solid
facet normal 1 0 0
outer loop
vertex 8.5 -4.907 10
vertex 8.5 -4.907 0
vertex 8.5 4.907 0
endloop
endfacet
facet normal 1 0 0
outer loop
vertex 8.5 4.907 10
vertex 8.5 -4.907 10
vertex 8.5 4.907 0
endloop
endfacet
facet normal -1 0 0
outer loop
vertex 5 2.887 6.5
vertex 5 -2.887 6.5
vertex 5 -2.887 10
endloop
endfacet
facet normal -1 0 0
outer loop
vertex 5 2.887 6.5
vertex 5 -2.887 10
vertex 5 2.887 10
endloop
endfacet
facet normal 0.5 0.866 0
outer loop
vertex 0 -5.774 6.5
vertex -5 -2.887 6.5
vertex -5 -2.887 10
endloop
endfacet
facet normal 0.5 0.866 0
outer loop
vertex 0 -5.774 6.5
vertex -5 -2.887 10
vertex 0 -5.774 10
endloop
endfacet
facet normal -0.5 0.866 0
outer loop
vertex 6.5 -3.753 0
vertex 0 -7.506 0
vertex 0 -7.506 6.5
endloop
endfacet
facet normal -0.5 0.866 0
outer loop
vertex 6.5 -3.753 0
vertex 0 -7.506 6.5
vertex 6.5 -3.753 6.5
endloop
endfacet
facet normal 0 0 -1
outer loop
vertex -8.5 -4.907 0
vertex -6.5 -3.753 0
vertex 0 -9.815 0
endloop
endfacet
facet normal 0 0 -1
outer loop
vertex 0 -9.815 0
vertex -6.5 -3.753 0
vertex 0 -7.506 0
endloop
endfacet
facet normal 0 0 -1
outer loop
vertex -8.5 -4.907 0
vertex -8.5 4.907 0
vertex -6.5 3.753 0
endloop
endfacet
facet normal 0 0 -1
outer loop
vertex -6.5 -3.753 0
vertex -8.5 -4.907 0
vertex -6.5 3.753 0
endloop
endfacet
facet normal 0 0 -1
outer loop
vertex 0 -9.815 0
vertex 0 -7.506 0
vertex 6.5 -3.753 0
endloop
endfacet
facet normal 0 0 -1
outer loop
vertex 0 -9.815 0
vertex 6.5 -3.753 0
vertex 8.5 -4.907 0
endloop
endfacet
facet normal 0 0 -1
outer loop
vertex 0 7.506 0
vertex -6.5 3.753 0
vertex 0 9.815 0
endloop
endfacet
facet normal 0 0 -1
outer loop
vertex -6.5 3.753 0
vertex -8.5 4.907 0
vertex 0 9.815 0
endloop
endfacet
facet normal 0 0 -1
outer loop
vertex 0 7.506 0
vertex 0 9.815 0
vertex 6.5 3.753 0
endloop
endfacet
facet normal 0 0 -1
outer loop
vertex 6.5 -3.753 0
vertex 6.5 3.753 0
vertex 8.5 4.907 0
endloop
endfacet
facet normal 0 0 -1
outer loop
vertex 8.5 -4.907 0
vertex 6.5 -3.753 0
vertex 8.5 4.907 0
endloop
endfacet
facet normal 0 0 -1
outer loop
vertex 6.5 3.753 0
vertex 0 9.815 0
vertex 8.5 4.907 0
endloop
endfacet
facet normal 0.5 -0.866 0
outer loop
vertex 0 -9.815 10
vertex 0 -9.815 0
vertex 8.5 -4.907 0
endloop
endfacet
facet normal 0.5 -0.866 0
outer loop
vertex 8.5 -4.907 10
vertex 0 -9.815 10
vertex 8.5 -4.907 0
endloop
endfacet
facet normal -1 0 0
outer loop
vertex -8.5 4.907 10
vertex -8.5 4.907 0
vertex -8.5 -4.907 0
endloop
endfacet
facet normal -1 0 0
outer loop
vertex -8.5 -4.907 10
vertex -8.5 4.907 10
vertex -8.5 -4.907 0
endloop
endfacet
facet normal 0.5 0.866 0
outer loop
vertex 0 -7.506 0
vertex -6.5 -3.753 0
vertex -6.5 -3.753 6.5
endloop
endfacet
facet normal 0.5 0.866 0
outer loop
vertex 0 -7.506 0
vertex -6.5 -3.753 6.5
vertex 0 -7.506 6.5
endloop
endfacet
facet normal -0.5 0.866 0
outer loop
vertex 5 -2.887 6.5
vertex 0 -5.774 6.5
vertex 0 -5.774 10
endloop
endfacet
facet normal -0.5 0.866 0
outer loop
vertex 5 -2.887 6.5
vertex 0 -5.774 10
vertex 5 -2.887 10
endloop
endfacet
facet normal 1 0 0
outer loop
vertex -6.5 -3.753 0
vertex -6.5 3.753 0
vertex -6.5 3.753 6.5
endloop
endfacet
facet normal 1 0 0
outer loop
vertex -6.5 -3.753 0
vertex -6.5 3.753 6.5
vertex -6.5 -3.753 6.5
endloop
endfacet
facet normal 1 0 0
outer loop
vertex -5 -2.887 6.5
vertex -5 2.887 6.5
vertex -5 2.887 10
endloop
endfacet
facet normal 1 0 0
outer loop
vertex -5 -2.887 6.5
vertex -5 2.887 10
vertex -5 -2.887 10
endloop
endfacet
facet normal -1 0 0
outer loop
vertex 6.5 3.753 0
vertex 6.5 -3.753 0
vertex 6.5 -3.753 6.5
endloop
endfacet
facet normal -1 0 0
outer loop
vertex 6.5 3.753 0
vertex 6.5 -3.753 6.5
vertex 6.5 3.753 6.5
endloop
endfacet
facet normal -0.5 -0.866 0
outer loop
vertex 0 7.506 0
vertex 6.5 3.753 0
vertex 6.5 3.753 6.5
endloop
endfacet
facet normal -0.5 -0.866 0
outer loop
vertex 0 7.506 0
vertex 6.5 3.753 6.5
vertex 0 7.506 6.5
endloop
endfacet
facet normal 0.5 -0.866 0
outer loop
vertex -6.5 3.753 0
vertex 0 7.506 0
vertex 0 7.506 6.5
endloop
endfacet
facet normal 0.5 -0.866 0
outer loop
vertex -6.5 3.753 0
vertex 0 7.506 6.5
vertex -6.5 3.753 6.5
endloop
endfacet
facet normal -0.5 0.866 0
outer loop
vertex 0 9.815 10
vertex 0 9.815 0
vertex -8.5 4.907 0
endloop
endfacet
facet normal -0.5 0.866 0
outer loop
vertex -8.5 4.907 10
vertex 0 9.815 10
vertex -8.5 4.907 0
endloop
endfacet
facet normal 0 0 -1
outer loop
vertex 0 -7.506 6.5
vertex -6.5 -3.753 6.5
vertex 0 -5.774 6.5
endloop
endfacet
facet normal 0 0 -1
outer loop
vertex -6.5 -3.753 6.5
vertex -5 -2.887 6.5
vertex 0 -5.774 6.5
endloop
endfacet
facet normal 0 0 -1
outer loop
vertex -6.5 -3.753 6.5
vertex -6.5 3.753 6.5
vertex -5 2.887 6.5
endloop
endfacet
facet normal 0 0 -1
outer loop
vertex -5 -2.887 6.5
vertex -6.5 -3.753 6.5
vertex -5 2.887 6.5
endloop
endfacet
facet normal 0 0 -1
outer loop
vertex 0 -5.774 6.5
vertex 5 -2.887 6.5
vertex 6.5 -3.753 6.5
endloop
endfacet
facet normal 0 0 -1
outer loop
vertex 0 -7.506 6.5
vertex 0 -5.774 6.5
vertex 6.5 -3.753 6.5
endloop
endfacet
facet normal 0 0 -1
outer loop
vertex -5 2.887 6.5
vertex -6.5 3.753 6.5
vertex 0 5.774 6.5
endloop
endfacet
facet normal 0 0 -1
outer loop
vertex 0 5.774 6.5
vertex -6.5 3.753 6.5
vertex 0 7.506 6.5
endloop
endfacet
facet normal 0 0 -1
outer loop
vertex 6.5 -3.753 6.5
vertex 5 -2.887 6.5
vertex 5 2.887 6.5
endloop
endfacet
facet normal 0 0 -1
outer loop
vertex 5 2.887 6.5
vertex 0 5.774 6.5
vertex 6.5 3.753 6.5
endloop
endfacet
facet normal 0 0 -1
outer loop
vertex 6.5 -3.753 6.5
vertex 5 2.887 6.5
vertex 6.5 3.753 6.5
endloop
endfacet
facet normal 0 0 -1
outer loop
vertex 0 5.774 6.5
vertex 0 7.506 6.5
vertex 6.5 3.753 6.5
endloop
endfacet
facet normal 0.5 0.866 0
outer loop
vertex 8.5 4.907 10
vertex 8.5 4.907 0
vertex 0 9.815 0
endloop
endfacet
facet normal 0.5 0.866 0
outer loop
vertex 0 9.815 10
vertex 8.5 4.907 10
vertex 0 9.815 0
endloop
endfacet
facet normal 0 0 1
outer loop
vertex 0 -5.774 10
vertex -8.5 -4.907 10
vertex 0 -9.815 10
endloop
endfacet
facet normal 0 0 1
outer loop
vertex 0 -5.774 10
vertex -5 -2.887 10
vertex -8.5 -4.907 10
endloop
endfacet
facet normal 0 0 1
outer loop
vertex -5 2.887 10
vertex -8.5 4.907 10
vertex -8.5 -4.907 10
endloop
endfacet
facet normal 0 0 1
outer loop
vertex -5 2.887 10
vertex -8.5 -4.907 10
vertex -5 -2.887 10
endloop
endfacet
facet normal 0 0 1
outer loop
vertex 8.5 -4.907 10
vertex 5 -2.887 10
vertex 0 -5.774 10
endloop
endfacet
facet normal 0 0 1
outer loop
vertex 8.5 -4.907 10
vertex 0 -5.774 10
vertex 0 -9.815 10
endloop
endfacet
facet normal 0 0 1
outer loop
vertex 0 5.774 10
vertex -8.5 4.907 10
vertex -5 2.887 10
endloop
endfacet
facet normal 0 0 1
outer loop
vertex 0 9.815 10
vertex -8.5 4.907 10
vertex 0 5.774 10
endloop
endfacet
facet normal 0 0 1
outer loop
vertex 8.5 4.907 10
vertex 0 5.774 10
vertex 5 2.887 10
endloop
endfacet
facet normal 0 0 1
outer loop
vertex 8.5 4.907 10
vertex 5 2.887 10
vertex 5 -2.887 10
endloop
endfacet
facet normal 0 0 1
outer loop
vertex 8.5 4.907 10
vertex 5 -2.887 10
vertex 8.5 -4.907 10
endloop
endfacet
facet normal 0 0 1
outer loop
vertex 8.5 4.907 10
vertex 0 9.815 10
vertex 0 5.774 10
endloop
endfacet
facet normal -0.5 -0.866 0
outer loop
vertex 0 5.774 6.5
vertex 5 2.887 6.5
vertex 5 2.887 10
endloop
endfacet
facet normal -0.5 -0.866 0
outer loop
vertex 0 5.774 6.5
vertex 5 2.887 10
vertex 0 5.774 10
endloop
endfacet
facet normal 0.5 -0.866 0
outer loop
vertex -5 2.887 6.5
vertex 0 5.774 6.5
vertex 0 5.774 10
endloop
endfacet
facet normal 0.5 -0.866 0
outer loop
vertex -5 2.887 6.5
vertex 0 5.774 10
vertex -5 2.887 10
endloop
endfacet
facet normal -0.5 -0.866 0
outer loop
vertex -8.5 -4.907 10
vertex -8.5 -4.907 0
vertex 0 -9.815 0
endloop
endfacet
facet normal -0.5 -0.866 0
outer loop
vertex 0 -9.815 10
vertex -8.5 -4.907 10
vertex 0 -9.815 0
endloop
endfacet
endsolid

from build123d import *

# Parameters (mm, degrees)
PAD_DEPTH    = 6.5
PAD001_DEPTH = 4
PAD002_DEPTH = 10


with BuildPart() as cuerpo:
    # Sketch → Pad (new body)
    with BuildSketch(Plane.XY):
        Polygon((0, 7.505553), (-6.5, 3.752777), (-6.5, -3.752777), (0, -7.505553), (6.5, -3.752777), (6.5, 3.752777), align=None)
    extrude(amount=PAD_DEPTH)

    # Sketch001 (on Face8 of Pad) → Pad001 (join)
    with BuildSketch(Plane.XY.offset(6.5)):
        Polygon((0, 5.773503), (-5, 2.886751), (-5, -2.886751), (0, -5.773503), (5, -2.886751), (5, 2.886751), align=None)
    extrude(amount=PAD001_DEPTH)


with BuildPart() as cut:
    # Sketch002 → Pad002 (new body)
    with BuildSketch(Plane.XY):
        Polygon((0, 9.814955), (-8.5, 4.907477), (-8.5, -4.907477), (0, -9.814955), (8.5, -4.907477), (8.5, 4.907477), align=None)
    extrude(amount=PAD002_DEPTH)

    # Cut: cut Cuerpo
    add(cuerpo.part, mode=Mode.SUBTRACT)


solid = cut.part
